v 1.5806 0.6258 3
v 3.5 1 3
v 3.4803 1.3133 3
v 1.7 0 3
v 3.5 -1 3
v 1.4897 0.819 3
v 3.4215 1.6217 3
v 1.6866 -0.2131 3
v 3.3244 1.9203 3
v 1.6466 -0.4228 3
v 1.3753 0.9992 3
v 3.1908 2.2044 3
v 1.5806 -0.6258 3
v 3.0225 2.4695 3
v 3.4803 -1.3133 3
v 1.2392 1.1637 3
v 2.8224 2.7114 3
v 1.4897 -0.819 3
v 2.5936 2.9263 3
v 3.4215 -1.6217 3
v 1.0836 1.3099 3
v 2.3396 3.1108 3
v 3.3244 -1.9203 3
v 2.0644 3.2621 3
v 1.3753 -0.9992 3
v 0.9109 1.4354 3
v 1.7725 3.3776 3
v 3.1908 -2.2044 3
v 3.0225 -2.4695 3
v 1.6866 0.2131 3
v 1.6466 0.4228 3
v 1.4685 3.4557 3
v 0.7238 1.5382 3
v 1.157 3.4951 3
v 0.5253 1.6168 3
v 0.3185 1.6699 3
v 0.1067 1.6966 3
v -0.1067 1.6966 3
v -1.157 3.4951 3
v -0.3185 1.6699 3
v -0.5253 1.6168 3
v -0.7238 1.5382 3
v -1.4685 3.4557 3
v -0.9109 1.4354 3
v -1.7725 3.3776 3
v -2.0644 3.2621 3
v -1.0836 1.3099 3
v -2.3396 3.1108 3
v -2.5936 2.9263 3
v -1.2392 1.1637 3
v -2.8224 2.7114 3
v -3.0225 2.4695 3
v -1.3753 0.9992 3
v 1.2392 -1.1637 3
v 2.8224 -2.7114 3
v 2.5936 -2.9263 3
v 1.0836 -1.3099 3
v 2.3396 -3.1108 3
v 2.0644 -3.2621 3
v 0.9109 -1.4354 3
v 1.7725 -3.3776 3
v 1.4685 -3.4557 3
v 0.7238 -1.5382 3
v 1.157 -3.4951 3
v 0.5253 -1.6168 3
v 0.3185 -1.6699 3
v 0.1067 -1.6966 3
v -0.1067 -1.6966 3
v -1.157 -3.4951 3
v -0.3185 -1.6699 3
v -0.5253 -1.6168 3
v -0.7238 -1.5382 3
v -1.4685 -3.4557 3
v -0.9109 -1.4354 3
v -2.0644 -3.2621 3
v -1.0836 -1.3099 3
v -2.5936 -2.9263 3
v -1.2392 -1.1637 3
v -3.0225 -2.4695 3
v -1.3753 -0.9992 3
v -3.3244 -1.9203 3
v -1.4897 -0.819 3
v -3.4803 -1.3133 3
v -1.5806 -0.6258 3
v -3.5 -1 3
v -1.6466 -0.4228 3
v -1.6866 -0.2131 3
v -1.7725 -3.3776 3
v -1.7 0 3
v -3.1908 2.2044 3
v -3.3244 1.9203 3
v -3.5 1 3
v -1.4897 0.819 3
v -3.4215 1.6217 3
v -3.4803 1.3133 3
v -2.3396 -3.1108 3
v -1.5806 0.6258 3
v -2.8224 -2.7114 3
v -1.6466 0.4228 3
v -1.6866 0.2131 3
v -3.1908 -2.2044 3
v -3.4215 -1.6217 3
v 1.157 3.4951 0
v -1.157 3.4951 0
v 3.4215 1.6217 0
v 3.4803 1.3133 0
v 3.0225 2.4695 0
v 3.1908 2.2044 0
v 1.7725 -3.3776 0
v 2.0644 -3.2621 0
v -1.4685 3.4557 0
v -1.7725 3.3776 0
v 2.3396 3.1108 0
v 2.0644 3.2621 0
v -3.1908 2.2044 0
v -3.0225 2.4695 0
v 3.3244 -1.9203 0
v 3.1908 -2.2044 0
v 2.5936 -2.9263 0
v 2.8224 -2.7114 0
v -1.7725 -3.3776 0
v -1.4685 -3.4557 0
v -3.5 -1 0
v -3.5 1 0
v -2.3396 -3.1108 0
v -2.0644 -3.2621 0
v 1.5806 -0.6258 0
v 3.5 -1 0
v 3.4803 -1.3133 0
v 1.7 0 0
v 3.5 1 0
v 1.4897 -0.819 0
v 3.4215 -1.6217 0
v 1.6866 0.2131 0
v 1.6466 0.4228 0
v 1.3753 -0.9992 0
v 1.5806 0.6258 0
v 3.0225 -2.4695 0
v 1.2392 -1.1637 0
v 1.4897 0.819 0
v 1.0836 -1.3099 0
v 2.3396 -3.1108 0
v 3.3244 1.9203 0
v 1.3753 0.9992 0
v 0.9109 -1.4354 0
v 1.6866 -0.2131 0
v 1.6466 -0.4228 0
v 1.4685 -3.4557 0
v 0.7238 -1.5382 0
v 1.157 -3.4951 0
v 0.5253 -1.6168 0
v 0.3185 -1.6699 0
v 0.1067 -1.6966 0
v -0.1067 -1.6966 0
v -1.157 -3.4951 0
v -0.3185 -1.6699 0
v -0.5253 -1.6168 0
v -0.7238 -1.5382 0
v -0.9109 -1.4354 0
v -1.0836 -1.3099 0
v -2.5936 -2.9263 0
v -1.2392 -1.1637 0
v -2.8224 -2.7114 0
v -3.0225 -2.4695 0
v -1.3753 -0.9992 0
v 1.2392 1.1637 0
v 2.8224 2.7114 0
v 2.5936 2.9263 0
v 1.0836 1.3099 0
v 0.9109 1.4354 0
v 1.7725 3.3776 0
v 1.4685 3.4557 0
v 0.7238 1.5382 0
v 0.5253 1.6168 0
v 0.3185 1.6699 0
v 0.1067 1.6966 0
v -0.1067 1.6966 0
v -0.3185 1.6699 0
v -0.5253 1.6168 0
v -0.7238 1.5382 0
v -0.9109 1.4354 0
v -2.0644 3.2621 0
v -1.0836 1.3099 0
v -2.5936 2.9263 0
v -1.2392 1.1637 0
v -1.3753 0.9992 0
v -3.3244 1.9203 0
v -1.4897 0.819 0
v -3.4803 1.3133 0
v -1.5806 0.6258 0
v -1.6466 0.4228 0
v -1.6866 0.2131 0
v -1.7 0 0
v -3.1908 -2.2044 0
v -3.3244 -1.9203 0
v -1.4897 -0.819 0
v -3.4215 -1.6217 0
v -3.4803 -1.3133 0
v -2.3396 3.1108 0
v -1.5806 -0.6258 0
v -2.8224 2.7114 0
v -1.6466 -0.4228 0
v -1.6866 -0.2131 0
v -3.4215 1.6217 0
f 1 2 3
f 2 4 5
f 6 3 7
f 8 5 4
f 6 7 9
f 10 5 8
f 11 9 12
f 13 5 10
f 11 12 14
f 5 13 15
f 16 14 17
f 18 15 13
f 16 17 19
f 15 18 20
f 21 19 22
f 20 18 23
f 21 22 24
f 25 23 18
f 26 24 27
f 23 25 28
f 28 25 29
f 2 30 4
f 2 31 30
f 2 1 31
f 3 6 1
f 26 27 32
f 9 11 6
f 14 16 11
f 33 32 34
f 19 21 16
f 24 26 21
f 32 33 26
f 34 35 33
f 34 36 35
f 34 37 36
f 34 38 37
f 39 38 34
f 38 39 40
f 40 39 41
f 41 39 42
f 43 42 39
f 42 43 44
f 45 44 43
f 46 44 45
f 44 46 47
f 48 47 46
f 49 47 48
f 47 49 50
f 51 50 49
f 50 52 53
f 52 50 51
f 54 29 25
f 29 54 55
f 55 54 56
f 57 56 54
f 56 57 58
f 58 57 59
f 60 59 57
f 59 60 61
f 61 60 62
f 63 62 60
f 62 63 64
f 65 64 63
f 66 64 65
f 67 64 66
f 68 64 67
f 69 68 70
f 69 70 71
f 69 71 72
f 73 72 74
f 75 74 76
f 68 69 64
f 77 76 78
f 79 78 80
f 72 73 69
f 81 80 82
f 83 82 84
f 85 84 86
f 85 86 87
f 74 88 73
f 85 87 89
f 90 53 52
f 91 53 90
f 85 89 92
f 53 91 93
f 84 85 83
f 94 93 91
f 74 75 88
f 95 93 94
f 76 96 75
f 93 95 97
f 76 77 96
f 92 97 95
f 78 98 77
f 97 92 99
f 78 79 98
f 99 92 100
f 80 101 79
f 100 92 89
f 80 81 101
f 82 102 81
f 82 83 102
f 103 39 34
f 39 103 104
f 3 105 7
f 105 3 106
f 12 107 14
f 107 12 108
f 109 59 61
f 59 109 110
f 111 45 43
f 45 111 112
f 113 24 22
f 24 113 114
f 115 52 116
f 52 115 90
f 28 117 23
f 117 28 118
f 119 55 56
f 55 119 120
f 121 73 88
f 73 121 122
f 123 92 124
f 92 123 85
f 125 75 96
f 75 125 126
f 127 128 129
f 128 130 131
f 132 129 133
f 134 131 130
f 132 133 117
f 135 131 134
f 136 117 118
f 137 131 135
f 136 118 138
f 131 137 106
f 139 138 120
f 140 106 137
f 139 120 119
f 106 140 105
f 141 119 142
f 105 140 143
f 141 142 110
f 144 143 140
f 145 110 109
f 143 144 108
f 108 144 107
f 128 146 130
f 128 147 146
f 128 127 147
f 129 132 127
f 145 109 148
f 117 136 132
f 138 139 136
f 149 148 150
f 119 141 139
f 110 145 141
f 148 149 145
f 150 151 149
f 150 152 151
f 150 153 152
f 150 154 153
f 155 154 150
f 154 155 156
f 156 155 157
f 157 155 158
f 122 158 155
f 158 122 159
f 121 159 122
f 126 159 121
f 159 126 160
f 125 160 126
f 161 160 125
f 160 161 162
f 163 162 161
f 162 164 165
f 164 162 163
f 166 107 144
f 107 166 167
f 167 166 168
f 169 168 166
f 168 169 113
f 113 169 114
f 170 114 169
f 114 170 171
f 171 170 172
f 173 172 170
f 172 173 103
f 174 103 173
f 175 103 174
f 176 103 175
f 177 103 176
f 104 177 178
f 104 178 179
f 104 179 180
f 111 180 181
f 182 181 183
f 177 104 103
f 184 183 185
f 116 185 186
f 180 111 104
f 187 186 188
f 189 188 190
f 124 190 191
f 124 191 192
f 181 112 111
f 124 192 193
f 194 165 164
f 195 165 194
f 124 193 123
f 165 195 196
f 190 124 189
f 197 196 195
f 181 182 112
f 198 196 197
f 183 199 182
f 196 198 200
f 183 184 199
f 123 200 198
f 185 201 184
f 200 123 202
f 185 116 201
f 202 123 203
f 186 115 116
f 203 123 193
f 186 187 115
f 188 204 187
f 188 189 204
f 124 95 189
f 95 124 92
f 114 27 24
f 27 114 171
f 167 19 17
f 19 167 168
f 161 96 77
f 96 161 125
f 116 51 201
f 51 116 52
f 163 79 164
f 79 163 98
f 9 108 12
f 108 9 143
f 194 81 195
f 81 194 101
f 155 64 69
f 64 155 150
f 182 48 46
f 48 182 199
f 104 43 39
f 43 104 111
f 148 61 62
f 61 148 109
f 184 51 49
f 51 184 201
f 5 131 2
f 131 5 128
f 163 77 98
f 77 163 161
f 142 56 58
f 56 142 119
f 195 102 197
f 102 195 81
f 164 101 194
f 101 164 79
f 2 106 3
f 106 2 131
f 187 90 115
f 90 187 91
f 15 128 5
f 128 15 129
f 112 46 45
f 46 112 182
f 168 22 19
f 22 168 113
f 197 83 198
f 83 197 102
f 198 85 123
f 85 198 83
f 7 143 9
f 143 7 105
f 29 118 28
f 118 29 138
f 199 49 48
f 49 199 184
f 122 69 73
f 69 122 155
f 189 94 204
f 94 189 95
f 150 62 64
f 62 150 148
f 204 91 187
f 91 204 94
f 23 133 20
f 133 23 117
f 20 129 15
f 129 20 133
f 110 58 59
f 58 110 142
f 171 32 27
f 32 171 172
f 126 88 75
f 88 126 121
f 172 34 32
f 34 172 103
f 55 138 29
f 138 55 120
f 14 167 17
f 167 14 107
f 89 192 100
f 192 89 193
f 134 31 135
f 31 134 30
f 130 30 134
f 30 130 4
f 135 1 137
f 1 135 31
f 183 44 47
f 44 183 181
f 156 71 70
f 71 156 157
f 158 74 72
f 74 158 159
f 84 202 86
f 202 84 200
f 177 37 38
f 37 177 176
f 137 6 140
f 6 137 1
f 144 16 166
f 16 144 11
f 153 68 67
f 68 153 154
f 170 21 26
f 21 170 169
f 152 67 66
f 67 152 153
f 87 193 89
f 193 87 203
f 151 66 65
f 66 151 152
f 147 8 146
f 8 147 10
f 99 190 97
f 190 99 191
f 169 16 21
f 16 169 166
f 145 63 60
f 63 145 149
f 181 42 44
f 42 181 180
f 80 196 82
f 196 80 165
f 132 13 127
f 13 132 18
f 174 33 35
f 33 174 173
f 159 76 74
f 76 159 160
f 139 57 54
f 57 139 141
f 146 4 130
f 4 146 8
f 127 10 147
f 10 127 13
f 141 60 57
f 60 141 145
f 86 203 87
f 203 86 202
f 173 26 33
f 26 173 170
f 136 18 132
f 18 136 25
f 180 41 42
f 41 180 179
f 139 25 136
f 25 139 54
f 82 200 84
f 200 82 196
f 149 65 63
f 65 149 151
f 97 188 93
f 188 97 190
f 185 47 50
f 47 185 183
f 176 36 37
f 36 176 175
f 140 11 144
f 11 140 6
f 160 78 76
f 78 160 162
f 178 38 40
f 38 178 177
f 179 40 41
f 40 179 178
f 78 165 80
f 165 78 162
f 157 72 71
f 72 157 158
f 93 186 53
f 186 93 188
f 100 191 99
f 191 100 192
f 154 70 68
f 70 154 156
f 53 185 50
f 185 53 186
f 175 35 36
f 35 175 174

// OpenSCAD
$fn = 50;


difference() {
	union() {
		translate(v = [0, 0, 0]) {
			rotate(a = [0, 0, 0]) {
				hull() {
					translate(v = [-1.0000000000, 1.0000000000, 0]) {
						rotate(a = [0, 0, 0]) {
							translate(v = [0, 0, 0]) {
								rotate(a = [0, 0, 0]) {
									cylinder(h = 3.0000000000, r = 2.5000000000);
								}
							}
						}
					}
					translate(v = [1.0000000000, 1.0000000000, 0]) {
						rotate(a = [0, 0, 0]) {
							translate(v = [0, 0, 0]) {
								rotate(a = [0, 0, 0]) {
									cylinder(h = 3.0000000000, r = 2.5000000000);
								}
							}
						}
					}
					translate(v = [-1.0000000000, -1.0000000000, 0]) {
						rotate(a = [0, 0, 0]) {
							translate(v = [0, 0, 0]) {
								rotate(a = [0, 0, 0]) {
									cylinder(h = 3.0000000000, r = 2.5000000000);
								}
							}
						}
					}
					translate(v = [1.0000000000, -1.0000000000, 0]) {
						rotate(a = [0, 0, 0]) {
							translate(v = [0, 0, 0]) {
								rotate(a = [0, 0, 0]) {
									cylinder(h = 3.0000000000, r = 2.5000000000);
								}
							}
						}
					}
				}
			}
		}
	}
	union() {
		translate(v = [0.0000000000, 0.0000000000, 0]) {
			rotate(a = [0, 0, 0]) {
				translate(v = [0, 0, -50]) {
					rotate(a = [0, 0, 0]) {
						cylinder(h = 100, r = 1.7000000000);
					}
				}
			}
		}
	}
}
